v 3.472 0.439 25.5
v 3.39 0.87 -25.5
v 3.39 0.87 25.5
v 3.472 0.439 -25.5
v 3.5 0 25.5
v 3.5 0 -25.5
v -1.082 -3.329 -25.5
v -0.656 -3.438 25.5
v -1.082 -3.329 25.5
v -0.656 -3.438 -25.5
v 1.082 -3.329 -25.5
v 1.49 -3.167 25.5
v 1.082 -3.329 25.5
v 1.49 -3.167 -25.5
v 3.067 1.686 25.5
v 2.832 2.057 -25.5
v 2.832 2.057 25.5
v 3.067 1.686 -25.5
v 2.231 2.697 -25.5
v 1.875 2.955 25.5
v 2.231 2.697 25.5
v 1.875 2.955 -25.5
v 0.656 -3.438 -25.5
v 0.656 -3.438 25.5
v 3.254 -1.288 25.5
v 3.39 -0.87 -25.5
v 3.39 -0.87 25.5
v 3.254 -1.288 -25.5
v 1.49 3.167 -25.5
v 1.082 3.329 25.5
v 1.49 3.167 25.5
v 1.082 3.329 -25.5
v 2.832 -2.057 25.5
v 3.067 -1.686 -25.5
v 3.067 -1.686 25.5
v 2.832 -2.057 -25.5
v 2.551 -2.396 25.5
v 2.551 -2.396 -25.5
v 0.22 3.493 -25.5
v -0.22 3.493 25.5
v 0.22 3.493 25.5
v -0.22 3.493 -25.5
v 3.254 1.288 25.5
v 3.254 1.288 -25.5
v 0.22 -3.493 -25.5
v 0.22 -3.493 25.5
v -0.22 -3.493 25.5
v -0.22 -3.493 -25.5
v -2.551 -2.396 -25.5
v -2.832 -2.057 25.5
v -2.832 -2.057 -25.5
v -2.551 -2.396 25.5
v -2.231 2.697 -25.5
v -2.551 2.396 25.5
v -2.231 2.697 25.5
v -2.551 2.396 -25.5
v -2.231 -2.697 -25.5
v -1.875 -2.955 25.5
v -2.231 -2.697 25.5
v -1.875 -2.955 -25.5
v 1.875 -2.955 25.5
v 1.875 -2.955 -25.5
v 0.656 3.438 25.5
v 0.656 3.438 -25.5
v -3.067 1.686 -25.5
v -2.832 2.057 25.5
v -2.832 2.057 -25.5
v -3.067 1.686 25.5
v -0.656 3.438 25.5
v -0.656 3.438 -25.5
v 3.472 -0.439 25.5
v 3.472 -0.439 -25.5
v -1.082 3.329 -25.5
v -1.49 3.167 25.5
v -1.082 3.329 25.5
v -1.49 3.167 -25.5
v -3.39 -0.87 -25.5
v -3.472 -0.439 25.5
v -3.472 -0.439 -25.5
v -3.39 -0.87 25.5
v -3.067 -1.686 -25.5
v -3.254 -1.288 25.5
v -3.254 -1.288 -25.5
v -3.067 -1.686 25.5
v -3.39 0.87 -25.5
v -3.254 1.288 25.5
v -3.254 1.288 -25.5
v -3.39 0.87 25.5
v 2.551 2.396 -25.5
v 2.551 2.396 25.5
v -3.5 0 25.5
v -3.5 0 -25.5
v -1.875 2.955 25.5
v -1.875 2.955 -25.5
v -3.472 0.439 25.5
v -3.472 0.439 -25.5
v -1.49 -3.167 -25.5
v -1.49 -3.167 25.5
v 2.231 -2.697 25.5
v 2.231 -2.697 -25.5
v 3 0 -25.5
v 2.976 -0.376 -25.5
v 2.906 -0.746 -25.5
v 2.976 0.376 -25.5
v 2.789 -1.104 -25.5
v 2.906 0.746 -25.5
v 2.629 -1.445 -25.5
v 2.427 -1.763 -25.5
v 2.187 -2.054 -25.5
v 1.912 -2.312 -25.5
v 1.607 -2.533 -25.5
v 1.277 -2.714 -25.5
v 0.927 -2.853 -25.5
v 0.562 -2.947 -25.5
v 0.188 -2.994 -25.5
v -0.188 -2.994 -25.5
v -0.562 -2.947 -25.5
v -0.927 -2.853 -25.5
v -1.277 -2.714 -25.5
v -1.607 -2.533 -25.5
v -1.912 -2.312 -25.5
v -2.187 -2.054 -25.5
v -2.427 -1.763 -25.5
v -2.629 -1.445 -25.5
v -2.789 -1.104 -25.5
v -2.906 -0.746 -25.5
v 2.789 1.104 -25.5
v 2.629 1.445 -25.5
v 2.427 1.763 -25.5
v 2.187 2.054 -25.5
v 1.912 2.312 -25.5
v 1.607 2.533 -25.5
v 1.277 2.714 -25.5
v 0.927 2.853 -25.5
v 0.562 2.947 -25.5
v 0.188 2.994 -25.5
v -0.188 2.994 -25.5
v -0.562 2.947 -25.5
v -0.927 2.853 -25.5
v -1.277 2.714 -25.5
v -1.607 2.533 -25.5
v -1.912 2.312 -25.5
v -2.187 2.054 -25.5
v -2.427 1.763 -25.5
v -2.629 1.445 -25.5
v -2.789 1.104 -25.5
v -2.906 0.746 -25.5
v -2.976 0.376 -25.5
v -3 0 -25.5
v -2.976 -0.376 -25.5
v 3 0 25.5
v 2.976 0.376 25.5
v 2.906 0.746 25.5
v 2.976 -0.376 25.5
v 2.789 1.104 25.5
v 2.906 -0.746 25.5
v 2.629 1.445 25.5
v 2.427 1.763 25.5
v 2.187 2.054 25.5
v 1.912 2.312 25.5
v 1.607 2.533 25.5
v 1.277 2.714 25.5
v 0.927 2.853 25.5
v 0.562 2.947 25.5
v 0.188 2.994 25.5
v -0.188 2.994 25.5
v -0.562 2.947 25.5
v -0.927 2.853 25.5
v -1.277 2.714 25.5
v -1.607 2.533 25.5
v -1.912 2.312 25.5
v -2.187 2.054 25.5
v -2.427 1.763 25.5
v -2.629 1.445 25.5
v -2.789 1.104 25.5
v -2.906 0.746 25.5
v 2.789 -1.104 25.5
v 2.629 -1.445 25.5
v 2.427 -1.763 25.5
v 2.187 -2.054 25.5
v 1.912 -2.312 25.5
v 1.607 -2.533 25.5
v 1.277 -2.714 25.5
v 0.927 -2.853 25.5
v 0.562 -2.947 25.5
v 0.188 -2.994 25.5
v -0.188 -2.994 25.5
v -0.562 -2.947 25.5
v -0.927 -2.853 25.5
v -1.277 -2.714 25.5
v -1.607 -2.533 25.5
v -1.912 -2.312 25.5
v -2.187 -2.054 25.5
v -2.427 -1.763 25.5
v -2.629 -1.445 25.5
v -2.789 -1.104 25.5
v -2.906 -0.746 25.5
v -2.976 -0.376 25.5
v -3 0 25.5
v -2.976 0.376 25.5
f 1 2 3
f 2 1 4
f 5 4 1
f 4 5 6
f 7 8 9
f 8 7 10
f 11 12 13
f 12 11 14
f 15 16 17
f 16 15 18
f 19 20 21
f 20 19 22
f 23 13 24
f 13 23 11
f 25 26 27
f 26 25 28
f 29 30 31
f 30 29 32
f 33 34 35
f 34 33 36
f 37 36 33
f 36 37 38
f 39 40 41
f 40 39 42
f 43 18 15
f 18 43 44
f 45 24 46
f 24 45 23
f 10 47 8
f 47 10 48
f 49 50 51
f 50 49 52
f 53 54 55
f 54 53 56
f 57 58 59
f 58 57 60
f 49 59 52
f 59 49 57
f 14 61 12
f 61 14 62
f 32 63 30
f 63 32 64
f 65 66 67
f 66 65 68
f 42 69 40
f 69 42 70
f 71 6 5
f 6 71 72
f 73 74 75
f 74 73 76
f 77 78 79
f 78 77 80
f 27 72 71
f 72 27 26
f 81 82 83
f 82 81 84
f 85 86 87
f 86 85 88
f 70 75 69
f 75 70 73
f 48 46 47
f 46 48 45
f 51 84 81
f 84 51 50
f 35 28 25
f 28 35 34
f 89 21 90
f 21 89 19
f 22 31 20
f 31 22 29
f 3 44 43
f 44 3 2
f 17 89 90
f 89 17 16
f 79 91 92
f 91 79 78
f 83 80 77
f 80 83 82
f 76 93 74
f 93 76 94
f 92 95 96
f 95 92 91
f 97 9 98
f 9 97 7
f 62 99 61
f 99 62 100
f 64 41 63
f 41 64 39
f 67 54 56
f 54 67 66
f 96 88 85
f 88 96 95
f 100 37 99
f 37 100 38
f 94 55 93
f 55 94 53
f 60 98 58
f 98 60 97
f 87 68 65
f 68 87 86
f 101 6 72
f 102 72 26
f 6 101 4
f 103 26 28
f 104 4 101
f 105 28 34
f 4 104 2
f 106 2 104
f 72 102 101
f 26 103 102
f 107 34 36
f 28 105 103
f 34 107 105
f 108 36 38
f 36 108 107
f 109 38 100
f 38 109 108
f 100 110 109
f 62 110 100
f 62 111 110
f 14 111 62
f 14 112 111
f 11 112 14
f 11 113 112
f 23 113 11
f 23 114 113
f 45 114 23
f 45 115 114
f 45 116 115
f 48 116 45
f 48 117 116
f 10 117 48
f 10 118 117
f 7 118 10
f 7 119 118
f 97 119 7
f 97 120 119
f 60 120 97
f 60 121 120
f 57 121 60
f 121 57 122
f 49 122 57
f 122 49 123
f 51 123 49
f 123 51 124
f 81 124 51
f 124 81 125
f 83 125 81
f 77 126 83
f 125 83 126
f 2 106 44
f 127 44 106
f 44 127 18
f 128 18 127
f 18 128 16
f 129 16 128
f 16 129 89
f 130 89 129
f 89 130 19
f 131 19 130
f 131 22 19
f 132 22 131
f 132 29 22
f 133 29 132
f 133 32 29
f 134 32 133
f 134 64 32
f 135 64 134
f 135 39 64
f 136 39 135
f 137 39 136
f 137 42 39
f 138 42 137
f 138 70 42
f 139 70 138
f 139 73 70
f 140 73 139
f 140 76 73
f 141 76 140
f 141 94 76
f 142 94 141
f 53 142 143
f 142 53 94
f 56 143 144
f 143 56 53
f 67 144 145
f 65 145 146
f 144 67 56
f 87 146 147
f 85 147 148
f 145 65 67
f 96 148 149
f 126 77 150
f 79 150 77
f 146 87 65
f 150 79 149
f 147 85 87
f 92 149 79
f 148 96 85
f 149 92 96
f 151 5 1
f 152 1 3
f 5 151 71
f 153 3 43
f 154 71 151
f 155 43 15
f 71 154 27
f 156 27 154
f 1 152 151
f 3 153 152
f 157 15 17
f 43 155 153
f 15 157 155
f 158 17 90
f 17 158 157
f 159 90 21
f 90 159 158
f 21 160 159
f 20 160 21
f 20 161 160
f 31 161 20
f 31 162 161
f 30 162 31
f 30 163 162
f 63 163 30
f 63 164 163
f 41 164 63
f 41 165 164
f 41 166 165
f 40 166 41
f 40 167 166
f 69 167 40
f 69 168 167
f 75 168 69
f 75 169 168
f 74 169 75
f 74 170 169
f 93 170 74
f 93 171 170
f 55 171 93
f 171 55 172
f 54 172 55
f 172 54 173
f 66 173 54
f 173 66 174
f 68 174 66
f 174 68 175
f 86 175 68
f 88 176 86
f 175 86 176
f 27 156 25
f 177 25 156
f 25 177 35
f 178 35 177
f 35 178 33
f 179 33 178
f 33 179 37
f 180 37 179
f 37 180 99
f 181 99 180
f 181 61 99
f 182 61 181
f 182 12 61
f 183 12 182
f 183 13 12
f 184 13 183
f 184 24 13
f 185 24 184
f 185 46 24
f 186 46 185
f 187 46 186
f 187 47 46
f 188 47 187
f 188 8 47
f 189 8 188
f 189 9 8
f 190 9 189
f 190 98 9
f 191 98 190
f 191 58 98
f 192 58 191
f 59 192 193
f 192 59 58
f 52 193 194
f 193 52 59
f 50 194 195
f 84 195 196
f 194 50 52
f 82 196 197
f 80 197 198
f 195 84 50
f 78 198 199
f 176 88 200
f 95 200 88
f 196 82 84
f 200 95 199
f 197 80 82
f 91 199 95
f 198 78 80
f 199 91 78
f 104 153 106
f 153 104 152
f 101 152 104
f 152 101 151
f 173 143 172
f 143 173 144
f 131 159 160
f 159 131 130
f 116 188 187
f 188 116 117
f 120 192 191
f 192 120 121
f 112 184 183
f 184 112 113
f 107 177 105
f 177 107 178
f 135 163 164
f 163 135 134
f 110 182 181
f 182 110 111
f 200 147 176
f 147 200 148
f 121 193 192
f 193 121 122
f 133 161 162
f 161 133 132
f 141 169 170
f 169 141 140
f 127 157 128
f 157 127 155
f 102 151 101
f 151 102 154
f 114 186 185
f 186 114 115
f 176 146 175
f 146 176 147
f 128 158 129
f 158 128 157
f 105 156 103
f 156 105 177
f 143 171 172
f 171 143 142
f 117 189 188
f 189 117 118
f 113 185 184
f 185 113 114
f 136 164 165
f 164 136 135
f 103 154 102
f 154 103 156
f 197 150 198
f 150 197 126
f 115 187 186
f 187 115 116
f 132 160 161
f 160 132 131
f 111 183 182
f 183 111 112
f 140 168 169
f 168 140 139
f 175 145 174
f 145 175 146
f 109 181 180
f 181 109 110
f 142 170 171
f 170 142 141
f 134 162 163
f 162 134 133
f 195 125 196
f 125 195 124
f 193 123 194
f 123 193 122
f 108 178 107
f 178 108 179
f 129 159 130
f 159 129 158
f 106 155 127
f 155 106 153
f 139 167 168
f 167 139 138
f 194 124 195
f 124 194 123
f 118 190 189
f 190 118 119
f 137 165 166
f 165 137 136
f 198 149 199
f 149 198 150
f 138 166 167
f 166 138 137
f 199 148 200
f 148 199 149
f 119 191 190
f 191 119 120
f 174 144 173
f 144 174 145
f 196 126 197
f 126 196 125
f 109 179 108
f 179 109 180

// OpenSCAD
$fn = 50;


difference() {
	union() {
		translate(v = [0, 0, -25.5000000000]) {
			cylinder(h = 51, r = 3.5000000000);
		}
	}
	union() {
		translate(v = [0, 0, -100.0000000000]) {
			cylinder(h = 200, r = 3.0000000000);
		}
	}
}
